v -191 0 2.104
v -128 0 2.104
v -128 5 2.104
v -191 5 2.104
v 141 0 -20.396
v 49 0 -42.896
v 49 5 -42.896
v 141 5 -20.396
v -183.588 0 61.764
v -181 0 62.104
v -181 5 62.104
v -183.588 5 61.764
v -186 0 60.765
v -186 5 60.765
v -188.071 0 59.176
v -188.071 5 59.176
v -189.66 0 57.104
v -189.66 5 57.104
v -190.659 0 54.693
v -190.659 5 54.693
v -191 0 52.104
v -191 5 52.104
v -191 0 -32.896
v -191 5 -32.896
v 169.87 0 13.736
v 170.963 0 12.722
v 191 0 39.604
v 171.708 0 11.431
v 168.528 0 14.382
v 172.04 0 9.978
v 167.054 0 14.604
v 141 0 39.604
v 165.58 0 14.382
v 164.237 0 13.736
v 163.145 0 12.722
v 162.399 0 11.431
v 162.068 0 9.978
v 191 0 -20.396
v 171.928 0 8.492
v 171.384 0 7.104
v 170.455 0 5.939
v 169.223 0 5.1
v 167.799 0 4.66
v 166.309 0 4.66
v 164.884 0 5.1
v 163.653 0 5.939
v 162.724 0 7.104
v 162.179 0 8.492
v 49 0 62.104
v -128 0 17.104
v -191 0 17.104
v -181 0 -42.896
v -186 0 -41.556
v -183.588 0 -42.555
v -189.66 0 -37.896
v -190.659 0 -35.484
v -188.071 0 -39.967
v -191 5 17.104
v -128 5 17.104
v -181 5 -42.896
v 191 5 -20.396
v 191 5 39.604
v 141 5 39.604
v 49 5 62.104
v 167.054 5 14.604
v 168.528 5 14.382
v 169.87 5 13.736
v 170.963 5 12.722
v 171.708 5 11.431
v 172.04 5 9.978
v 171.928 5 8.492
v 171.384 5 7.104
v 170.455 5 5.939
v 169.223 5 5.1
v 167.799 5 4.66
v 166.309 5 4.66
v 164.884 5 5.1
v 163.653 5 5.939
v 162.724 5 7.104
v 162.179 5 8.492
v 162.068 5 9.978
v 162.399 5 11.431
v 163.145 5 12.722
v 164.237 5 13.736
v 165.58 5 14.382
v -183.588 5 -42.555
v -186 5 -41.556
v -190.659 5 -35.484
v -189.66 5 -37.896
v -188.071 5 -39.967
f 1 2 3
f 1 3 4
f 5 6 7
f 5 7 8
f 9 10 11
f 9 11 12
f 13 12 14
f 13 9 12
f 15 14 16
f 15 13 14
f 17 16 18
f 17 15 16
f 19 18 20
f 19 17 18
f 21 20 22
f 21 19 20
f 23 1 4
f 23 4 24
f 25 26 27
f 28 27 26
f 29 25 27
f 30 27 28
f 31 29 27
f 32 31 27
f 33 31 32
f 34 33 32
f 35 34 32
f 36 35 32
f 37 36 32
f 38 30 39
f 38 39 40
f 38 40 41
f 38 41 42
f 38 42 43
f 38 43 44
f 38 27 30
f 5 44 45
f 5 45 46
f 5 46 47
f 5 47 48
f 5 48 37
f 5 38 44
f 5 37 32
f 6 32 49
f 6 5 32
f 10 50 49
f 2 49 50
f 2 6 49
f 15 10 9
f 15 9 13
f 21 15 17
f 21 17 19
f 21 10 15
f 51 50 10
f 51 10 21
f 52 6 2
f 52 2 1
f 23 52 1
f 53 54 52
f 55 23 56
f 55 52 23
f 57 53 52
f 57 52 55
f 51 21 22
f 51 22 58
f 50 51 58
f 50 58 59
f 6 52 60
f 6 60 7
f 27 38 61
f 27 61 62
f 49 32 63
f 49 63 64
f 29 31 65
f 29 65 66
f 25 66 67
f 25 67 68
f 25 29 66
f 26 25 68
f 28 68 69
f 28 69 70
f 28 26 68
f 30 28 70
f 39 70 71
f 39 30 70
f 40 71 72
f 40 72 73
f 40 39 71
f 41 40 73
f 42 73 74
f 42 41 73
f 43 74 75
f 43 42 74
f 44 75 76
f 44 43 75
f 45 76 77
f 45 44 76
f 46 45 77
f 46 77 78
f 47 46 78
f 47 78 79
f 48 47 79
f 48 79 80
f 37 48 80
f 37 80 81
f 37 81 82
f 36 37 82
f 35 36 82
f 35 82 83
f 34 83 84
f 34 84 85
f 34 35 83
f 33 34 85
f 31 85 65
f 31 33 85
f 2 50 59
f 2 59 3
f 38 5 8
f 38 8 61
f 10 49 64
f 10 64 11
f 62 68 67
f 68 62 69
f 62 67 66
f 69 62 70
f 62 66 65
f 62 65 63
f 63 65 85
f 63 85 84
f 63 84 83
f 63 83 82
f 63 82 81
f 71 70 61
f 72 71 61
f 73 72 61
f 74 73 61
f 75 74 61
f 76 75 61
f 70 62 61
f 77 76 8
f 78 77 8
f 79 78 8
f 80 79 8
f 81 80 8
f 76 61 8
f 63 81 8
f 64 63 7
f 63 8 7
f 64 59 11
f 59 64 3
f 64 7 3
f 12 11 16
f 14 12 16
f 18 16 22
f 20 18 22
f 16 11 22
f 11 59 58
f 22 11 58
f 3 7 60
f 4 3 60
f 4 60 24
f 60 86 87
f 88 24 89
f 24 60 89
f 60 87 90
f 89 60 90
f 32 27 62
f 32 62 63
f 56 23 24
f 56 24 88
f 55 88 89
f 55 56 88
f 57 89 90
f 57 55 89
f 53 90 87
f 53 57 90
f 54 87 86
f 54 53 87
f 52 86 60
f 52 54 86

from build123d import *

# Parameters (mm, degrees)
SKETCH1_R           = 5
BOSS_EXTRUDE1_DEPTH = 5


with BuildPart() as part:
    # Sketch1 → Boss-Extrude1 (new body)
    with BuildSketch(Plane(origin=(0, 0, 0), x_dir=(1, 0, 0), z_dir=(0, 1, 0))):
        with BuildLine():
            Line((49, -62.104477612), (-181, -62.104477612))
            ThreePointArc((-181, -62.104477612), (-188.071067812, -59.175545424), (-191, -52.104477612))
            Line((-191, -52.104477612), (-191, -17.104477612))
            Line((-191, -17.104477612), (-128, -17.104477612))
            Line((-128, -17.104477612), (-128, -2.104477612))
            Line((-128, -2.104477612), (-191, -2.104477612))
            Line((-191, -2.104477612), (-191, 32.895522388))
            ThreePointArc((-191, 32.895522388), (-188.071067812, 39.9665902), (-181, 42.895522388))
            Line((-181, 42.895522388), (49, 42.895522388))
            Line((49, 42.895522388), (141, 20.395522388))
            Line((141, 20.395522388), (191, 20.395522388))
            Line((191, 20.395522388), (191, -39.604477612))
            Line((191, -39.604477612), (141, -39.604477612))
            Line((141, -39.604477612), (49, -62.104477612))
        make_face()
        with Locations(Location((167.053731343, -9.604477612, 0), (0, 0, 270))):
            Circle(SKETCH1_R, mode=Mode.SUBTRACT)
    extrude(amount=BOSS_EXTRUDE1_DEPTH)


solid = part.part
